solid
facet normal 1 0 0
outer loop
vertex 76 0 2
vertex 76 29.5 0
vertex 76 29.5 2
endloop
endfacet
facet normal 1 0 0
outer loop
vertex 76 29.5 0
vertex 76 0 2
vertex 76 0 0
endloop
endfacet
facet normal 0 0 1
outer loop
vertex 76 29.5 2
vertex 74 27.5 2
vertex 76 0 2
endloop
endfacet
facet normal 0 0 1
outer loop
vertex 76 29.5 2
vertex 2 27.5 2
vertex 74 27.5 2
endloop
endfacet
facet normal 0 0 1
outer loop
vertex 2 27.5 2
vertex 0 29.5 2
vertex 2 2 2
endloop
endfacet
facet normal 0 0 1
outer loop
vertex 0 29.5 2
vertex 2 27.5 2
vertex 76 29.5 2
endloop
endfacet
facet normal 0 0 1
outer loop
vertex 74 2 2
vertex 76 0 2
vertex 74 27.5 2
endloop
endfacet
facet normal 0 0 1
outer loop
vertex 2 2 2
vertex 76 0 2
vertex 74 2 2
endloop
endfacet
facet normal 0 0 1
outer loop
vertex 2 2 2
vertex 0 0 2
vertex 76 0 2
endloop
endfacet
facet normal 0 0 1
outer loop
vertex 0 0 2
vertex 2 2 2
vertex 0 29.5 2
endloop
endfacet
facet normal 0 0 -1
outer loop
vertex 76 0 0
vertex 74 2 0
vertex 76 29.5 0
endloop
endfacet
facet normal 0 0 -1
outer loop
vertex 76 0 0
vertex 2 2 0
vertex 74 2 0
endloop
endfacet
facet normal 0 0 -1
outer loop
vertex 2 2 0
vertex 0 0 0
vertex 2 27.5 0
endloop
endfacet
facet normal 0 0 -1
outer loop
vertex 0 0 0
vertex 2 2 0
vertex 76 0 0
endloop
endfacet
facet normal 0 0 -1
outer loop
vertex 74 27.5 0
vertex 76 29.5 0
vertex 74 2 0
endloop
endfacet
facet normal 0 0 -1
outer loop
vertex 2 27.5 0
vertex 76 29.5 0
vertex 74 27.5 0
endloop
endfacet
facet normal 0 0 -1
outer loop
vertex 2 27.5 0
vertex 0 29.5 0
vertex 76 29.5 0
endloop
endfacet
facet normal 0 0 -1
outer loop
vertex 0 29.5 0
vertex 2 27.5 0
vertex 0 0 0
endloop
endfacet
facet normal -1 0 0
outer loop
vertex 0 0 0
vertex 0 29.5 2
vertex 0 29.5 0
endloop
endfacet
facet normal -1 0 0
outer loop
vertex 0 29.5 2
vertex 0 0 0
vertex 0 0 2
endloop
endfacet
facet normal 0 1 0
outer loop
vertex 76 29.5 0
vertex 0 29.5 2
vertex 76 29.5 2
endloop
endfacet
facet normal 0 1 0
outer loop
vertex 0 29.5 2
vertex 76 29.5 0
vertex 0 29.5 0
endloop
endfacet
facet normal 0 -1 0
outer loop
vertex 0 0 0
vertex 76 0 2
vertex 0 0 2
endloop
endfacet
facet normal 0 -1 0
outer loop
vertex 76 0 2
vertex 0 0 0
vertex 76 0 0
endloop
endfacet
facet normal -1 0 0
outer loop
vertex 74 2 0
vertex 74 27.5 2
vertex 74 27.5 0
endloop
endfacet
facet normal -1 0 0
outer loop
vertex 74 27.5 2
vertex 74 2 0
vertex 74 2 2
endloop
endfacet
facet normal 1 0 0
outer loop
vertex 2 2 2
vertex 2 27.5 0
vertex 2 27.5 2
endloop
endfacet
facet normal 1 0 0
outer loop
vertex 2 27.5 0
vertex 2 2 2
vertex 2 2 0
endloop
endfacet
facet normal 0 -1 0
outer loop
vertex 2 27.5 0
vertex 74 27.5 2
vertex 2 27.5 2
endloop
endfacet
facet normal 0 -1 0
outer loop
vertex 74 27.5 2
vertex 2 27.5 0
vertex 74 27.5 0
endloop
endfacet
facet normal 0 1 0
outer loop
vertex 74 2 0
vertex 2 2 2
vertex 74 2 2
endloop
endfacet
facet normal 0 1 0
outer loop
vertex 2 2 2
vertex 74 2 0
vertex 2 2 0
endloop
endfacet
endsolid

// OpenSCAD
difference(){
    cube([76,29.5,2]);
    translate([2,2,-1]){
        cube([72,25.5,4]);
    }
}
